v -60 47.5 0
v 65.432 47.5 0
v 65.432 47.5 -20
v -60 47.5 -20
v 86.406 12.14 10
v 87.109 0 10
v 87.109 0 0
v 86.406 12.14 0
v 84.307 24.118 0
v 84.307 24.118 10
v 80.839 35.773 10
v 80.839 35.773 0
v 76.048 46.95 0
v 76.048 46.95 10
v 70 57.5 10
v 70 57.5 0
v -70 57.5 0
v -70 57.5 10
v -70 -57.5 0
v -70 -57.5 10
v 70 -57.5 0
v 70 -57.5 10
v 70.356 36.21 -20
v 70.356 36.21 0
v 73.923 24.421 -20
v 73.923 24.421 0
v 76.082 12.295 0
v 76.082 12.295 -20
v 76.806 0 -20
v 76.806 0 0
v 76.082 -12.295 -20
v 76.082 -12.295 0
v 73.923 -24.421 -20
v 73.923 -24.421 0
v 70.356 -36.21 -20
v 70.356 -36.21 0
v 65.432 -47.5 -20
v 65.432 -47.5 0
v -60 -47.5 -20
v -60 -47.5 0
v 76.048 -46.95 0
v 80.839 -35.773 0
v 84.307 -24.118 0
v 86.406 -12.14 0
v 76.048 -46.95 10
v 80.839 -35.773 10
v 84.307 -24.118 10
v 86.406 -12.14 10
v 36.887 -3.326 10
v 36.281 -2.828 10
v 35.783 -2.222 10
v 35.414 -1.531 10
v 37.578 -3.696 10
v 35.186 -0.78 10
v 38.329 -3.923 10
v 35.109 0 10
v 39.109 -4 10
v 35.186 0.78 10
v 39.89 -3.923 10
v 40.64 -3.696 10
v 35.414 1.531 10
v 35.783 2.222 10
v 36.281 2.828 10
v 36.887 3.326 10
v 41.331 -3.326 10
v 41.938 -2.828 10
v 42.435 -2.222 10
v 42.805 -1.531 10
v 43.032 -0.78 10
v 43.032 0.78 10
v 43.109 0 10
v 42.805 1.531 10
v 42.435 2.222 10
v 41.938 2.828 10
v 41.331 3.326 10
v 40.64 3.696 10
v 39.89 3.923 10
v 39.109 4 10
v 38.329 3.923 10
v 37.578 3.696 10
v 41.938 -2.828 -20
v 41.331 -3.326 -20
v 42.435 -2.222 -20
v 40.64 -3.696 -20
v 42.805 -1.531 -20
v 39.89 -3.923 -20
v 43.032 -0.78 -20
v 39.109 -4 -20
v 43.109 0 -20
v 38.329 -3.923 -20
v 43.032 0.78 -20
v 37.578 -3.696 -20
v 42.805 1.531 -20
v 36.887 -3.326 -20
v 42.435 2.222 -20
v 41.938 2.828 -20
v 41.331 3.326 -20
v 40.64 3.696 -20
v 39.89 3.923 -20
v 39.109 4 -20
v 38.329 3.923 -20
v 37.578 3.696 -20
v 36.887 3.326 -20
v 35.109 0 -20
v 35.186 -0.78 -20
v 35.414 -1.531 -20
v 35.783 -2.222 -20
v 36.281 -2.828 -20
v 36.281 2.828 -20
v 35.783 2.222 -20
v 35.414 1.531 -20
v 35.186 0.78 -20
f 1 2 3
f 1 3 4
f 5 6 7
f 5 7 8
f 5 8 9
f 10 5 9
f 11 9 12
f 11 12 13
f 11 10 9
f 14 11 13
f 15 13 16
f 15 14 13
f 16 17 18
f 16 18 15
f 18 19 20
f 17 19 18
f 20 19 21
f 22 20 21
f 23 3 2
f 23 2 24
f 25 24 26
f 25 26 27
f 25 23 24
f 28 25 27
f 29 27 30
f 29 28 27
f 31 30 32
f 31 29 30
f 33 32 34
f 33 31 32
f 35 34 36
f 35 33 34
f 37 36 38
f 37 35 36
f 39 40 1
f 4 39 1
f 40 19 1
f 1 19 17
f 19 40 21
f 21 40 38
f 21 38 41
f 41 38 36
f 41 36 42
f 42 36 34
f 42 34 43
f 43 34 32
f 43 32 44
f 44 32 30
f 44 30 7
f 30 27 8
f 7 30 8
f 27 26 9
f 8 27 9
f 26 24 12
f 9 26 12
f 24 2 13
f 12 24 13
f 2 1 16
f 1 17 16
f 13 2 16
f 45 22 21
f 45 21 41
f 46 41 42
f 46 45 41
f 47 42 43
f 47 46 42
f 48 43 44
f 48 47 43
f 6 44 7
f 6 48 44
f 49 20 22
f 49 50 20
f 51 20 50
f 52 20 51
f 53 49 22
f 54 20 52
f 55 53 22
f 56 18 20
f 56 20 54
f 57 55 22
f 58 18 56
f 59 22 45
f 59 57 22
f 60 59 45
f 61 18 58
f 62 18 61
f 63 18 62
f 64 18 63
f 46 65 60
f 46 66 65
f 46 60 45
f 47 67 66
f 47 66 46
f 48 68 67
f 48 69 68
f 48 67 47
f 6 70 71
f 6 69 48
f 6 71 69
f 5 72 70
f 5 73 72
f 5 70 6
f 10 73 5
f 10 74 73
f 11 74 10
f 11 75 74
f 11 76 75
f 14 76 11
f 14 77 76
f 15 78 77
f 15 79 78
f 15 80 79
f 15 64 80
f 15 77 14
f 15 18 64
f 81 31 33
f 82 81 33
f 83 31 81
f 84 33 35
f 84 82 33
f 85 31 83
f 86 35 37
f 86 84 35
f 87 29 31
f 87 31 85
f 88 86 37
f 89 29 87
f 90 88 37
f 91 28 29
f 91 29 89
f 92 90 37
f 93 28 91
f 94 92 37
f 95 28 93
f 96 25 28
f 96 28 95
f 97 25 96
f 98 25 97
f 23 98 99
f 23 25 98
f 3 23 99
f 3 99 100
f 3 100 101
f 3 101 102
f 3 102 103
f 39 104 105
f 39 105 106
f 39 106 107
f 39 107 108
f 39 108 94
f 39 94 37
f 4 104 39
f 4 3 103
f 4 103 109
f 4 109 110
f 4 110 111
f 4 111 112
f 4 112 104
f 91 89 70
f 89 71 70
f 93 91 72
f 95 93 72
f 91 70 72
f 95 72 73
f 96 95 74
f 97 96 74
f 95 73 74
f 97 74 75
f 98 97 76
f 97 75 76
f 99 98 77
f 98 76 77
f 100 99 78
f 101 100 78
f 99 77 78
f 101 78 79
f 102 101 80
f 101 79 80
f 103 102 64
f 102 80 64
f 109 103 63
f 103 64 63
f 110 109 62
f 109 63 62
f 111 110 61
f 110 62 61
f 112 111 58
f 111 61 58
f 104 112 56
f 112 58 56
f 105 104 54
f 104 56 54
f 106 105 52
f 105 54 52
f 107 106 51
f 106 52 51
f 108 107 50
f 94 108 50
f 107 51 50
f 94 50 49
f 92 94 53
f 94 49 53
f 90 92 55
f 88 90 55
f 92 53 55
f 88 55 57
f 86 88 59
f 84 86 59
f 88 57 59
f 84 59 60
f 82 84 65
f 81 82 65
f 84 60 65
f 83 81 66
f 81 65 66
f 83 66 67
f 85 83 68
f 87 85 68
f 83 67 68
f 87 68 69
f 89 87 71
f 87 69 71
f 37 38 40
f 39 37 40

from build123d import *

# Parameters (mm, degrees)
SKETCH_1_W          = 140
SKETCH_1_H          = 115
EXTRUDE_1_DEPTH     = 10
EXTRUDE_3_DEPTH     = 10
SKETCH_3_R          = 35
CUT_EXTRUDE_2_DEPTH = 10
SKETCH_4_R          = 35
EXTRUDE_4_DEPTH     = 10
SKETCH_5_R          = 4
CUT_EXTRUDE_3_DEPTH = 105.85349984
SKETCH_6_W          = 125.431788303
SKETCH_6_H          = 95
EXTRUDE_5_DEPTH     = 20
EXTRUDE_6_DEPTH     = 20
SKETCH_8_R          = 4
CUT_EXTRUDE_5_DEPTH = 107.274439207


with BuildPart() as part:
    # 草图1 → 凸台-拉伸1 (new body)
    with BuildSketch(Plane.XY):
        Rectangle(SKETCH_1_W, SKETCH_1_H)
    extrude(amount=EXTRUDE_1_DEPTH)

    # 草图2 → 凸台-拉伸3 (add)
    with BuildSketch(Plane.XY.offset(10)):
        with BuildLine():
            ThreePointArc((87.109163862, 0), (82.741171521, 29.995722562), (70, 57.5))
            Line((70, 57.5), (70, -57.5))
            ThreePointArc((70, -57.5), (82.741171521, -29.995722562), (87.109163862, 0))
        make_face()
    extrude(amount=-EXTRUDE_3_DEPTH)

    # 草图3 → 切除-拉伸2 (cut)
    with BuildSketch(Plane.XY.offset(10)):
        with Locations((37.109163862, 0)):
            Circle(SKETCH_3_R)
    extrude(amount=-CUT_EXTRUDE_2_DEPTH, mode=Mode.SUBTRACT)

    # 草图4 → 凸台-拉伸4 (add)
    with BuildSketch(Plane.XY.offset(10)):
        with Locations((37.109163862, 0)):
            Circle(SKETCH_4_R)
    extrude(amount=-EXTRUDE_4_DEPTH)

    # 草图5 → 切除-拉伸3 (cut, through all)
    with BuildSketch(Plane.XY.offset(10)):
        with Locations((39.109163862, 0)):
            Circle(SKETCH_5_R)
    extrude(amount=-CUT_EXTRUDE_3_DEPTH, mode=Mode.SUBTRACT)

    # 草图6 → 凸台-拉伸5 (add)
    with BuildSketch(Plane(origin=(0, 0, 0), x_dir=(-1, 0, 0), z_dir=(0, 0, -1))):
        with Locations((-2.715894151, 0)):
            Rectangle(SKETCH_6_W, SKETCH_6_H)
    extrude(amount=EXTRUDE_5_DEPTH)

    # 草图7 → 凸台-拉伸6 (add)
    with BuildSketch(Plane(origin=(0, 0, -20), x_dir=(-1, 0, 0), z_dir=(0, 0, -1))):
        with BuildLine():
            Line((-65.431788303, -47.5), (-65.431788303, 47.5))
            ThreePointArc((-65.431788303, 47.5), (-76.80558662, 0), (-65.431788303, -47.5))
        make_face()
    extrude(amount=-EXTRUDE_6_DEPTH)

    # 草图8 → 切除-拉伸5 (cut, through all)
    with BuildSketch(Plane.XY):
        with Locations((39.109163862, 0)):
            Circle(SKETCH_8_R)
    extrude(amount=-CUT_EXTRUDE_5_DEPTH, mode=Mode.SUBTRACT)


solid = part.part
